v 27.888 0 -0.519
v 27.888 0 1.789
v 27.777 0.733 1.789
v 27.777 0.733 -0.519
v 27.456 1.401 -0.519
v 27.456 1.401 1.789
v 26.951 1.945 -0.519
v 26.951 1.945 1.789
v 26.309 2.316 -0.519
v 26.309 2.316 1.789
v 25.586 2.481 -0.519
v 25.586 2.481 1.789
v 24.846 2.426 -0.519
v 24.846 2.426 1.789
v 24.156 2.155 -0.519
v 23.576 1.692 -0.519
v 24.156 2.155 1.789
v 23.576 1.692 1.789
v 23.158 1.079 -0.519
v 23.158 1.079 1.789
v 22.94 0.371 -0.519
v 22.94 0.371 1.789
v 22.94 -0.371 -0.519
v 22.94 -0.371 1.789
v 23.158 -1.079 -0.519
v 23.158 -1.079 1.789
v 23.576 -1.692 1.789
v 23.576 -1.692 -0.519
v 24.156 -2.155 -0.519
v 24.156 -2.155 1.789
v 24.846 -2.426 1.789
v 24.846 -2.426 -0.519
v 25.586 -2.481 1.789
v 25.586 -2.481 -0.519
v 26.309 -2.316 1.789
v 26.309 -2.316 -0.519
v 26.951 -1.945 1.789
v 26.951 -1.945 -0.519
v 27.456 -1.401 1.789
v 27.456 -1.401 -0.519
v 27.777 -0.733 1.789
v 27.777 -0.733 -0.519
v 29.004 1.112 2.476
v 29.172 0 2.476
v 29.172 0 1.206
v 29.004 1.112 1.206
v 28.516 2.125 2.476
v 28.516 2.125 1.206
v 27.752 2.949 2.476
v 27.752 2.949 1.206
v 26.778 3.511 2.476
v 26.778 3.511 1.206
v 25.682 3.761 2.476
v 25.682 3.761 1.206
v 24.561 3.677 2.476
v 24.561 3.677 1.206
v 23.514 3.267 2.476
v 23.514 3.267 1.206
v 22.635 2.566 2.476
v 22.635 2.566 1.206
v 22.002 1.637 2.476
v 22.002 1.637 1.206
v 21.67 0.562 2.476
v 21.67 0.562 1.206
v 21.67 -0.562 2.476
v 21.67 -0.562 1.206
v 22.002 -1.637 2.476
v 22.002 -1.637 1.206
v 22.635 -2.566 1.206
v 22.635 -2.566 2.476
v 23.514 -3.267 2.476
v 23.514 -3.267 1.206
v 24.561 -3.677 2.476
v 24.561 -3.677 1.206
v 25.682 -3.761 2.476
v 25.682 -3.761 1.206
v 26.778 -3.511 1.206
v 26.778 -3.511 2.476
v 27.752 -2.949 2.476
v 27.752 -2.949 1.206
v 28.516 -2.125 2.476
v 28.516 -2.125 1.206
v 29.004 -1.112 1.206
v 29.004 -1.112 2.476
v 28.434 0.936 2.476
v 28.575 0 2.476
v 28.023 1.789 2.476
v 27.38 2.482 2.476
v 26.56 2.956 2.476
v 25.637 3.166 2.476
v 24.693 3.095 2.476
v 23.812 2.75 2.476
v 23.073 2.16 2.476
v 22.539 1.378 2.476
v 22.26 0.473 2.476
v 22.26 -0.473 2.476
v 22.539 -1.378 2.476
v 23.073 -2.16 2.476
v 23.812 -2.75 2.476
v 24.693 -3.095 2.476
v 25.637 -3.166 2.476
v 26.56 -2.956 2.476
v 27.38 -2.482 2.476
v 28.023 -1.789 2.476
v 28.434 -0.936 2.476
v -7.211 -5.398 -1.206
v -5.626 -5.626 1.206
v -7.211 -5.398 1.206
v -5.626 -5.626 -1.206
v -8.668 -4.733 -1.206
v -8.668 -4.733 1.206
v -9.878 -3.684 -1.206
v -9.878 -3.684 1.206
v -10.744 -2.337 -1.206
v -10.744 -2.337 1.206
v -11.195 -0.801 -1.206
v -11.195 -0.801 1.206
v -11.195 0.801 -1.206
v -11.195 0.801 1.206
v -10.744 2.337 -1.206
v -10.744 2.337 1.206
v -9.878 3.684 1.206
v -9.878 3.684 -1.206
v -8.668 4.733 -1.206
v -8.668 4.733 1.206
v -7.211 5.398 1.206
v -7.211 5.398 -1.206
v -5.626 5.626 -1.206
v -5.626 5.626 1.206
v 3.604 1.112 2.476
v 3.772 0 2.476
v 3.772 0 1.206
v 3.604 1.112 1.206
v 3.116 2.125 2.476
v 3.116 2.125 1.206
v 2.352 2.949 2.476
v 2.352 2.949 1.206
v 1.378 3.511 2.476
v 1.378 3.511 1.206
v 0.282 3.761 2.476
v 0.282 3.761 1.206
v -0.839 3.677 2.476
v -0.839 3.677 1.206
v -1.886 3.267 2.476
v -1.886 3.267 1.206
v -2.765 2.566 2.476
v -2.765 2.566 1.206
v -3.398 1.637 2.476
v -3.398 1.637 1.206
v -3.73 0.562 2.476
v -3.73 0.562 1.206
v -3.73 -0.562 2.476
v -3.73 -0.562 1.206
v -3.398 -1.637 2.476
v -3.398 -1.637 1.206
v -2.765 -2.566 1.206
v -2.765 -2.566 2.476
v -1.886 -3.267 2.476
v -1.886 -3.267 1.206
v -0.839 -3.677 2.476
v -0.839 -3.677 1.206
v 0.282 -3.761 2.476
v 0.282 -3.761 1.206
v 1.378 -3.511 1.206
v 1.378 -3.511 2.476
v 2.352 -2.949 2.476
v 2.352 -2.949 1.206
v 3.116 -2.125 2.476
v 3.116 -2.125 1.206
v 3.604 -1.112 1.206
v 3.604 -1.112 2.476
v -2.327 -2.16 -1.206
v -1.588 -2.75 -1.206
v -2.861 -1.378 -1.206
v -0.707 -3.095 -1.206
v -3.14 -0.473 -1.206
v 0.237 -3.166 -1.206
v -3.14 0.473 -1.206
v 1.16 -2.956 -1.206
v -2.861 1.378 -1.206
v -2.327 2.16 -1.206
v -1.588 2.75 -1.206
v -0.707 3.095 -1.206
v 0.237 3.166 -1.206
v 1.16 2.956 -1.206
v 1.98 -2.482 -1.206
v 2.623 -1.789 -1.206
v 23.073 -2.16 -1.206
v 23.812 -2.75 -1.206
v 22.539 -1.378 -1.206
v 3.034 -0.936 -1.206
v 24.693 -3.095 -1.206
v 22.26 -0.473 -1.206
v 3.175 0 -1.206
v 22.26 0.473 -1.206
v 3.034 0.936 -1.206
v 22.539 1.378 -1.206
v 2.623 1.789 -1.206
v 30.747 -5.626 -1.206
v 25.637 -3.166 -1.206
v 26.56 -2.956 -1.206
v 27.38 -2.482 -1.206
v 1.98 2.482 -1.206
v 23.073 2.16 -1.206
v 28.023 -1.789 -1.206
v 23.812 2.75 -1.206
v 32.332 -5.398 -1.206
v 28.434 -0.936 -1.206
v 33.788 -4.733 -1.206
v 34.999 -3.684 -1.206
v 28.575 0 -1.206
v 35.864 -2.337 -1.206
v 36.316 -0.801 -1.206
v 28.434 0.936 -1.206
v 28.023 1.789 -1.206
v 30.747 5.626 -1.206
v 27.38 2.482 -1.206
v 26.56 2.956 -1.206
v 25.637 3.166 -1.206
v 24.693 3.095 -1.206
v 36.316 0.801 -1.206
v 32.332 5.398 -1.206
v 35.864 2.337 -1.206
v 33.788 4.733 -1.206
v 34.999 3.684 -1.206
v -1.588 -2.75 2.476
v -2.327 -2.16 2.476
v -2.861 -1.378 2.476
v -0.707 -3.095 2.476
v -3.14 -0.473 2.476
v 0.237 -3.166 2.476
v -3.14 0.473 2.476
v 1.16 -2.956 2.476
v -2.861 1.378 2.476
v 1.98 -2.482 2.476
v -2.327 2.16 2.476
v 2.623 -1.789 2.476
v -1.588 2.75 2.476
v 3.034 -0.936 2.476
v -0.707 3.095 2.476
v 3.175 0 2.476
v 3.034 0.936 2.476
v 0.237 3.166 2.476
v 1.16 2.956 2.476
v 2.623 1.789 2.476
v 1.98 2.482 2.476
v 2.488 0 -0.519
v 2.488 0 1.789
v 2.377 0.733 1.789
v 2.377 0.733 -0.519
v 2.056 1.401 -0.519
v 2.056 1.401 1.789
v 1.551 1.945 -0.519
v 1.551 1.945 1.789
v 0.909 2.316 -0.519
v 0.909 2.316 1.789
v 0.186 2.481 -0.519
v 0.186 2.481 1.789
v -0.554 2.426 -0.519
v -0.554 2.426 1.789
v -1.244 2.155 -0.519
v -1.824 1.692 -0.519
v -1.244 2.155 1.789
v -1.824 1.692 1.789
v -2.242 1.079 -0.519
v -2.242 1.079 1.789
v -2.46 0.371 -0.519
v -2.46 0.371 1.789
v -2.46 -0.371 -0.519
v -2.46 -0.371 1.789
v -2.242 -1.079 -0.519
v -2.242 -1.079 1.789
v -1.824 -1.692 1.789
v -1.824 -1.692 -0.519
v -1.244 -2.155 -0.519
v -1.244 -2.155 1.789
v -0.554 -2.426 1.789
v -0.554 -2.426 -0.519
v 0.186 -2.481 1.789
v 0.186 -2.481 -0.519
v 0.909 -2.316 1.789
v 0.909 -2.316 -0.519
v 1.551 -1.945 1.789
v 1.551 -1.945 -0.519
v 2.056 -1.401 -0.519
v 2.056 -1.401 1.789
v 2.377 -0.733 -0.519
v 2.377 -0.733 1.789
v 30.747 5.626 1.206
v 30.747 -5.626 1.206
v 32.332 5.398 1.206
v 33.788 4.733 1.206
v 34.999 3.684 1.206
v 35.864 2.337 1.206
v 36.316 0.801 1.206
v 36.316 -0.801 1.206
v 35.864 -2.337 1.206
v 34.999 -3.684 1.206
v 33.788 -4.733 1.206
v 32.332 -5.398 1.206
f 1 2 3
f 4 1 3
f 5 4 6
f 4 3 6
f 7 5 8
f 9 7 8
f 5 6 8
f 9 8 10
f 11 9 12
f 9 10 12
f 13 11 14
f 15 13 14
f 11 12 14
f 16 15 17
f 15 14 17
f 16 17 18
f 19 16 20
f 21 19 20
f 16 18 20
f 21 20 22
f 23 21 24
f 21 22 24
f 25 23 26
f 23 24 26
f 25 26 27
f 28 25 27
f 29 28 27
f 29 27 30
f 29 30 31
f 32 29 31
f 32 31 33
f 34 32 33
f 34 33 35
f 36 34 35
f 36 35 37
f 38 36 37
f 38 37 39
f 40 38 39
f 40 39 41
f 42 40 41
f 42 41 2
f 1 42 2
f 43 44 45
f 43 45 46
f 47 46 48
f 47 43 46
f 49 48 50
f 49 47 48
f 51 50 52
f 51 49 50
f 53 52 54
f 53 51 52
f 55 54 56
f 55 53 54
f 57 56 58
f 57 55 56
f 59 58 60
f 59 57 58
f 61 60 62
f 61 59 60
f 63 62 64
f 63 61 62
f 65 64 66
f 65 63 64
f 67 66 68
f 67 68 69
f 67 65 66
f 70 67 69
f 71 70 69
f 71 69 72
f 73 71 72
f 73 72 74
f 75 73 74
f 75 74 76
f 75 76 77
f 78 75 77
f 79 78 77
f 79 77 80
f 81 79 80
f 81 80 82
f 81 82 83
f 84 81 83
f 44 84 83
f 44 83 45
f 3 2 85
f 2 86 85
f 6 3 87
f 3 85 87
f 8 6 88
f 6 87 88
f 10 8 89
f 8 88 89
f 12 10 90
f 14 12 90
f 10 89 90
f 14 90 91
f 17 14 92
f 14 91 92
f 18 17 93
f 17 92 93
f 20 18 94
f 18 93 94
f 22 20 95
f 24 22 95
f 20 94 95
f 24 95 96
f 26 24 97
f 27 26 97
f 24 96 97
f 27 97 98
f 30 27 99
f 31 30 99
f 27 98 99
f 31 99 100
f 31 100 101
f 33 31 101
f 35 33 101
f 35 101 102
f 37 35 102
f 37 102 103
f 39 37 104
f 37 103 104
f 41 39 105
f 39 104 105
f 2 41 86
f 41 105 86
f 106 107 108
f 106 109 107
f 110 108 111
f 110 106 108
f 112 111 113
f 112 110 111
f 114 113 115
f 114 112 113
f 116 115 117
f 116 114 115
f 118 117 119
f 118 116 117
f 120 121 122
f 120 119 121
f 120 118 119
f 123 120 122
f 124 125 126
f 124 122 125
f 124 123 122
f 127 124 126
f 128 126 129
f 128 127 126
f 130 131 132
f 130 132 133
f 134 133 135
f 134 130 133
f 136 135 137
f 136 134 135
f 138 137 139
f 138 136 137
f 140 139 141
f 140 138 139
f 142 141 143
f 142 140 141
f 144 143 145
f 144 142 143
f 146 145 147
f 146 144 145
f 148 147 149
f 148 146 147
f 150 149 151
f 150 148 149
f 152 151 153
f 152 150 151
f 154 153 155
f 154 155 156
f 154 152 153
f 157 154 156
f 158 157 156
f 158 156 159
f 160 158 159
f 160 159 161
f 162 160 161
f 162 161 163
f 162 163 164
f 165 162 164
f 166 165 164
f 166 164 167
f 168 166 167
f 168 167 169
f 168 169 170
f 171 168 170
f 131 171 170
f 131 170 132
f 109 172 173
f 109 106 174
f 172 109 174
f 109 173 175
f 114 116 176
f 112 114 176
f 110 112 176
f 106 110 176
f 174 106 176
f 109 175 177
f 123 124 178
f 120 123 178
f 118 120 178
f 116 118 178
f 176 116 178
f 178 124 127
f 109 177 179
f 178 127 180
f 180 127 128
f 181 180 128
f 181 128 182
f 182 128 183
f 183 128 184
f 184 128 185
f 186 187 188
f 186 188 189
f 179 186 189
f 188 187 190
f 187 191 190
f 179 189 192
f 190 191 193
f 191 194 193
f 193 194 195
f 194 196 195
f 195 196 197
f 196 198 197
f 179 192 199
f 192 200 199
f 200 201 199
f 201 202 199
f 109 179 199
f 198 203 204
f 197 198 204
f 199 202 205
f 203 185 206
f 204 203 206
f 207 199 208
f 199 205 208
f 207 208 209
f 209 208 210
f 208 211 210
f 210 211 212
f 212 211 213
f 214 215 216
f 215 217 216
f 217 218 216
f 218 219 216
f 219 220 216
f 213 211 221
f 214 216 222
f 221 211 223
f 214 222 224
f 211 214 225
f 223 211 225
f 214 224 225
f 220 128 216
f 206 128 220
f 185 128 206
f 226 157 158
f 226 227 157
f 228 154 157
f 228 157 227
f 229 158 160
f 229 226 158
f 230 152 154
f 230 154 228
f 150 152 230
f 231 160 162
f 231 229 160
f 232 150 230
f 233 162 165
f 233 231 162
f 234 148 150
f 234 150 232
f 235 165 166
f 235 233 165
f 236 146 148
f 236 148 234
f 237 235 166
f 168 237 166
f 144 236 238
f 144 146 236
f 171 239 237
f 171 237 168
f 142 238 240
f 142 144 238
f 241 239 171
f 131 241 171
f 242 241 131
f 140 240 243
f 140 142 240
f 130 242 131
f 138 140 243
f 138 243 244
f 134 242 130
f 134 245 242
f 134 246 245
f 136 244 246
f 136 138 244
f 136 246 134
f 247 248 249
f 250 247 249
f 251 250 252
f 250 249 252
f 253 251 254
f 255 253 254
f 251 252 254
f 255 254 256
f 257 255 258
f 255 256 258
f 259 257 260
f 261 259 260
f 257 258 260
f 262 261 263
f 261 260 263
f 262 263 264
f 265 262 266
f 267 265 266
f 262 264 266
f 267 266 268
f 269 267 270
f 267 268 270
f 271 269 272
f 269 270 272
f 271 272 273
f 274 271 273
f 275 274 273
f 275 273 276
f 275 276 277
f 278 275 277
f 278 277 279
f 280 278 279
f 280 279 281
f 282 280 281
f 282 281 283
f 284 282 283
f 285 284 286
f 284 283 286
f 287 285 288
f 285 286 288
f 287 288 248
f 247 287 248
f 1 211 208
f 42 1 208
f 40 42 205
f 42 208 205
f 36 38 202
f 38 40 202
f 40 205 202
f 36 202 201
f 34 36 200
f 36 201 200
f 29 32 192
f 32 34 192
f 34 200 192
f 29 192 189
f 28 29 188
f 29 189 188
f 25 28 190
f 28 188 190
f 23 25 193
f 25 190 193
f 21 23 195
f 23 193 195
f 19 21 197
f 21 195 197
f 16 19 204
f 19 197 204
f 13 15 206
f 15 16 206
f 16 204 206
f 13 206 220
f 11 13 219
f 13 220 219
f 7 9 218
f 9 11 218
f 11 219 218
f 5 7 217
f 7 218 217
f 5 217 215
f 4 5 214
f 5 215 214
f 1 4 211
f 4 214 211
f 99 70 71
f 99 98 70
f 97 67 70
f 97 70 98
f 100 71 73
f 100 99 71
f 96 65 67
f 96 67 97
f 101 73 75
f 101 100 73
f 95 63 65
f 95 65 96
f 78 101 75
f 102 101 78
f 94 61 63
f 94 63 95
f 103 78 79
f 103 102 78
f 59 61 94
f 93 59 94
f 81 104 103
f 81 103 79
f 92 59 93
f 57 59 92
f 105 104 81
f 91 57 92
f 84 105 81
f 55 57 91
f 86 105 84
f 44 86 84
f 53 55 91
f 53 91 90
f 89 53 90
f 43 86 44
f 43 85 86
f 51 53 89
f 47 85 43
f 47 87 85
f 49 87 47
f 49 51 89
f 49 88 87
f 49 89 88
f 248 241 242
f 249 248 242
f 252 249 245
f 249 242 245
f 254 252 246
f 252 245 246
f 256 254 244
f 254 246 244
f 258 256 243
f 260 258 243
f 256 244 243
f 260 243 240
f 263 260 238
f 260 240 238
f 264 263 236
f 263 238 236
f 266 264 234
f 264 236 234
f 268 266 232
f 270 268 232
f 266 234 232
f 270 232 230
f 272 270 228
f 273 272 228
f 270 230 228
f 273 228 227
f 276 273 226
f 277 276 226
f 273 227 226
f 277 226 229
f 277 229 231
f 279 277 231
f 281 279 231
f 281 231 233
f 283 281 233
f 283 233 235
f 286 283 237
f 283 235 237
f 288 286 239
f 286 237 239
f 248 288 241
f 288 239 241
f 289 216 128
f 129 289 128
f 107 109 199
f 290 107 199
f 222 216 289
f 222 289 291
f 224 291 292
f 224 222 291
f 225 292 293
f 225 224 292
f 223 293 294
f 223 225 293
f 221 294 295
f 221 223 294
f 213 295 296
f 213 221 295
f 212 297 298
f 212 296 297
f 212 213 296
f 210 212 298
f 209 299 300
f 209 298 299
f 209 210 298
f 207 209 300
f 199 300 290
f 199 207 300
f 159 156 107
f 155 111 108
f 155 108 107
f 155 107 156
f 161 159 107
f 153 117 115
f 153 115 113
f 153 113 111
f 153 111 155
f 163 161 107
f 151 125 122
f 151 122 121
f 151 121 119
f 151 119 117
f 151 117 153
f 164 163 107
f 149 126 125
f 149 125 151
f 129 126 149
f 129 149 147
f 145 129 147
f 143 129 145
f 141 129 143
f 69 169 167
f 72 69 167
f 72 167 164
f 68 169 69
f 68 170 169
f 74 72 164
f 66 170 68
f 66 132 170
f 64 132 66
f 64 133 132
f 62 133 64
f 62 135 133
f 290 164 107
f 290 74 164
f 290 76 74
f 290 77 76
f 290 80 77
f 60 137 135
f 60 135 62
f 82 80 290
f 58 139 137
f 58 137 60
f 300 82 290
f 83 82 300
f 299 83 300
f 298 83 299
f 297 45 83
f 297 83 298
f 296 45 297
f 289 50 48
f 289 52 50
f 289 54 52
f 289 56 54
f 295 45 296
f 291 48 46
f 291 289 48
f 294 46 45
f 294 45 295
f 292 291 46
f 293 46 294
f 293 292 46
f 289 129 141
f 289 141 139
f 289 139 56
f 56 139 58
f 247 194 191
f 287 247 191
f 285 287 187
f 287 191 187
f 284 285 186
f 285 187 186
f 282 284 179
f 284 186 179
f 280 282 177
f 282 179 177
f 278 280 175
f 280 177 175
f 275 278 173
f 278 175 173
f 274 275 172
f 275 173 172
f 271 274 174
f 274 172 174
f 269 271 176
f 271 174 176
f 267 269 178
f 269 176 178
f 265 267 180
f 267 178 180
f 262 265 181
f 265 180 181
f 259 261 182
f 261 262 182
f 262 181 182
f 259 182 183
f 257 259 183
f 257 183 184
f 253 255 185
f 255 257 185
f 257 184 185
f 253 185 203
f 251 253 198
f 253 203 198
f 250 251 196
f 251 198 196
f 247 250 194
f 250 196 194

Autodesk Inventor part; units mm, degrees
sketch "Sketch_1" plane through (0, 0, 0) normal (0, 0, 1) x (1, 0, 0)
  arc A0 (-5.6261, 5.6261) -> (-5.6261, -5.6261) centre (-5.6261, 0) ccw
  line L0 (-5.6261, -5.6261) -> (30.7467, -5.6261)
  arc A1 (30.7467, -5.6261) -> (30.7467, 5.6261) centre (30.7467, 0) ccw
  line L1 (30.7467, 5.6261) -> (-5.6261, 5.6261)
extrude "Extrusion1" add sketch "Sketch_1" along normal mid plane 2.413
sketch "Sketch_2" plane through (0, 0, 0) normal (0, 1, 0) x (-1, 0, 0)
  line L0 (0, 2.4765) -> (0, -1.2065)
  line L1 (0, -1.2065) -> (-3.7719, -1.2065)
  line L2 (-3.7719, -1.2065) -> (-3.7719, 2.4765)
  line L3 (-3.7719, 2.4765) -> (0, 2.4765)
  line L4 (0, 2.4765) -> (0, -1.2065)
revolve "Revolution1" add sketch "Sketch_2" angle 360 about axis through (0, 0, 2.4765) along (0, 0, 1)
sketch "Sketch_3" plane through (0, 0, 0) normal (0, 1, 0) x (-1, 0, 0)
  line L0 (-25.4, 2.4765) -> (-25.4, -1.2065)
  line L1 (-25.4, -1.2065) -> (-29.1719, -1.2065)
  line L2 (-29.1719, -1.2065) -> (-29.1719, 2.4765)
  line L3 (-29.1719, 2.4765) -> (-25.4, 2.4765)
  line L4 (-25.4, 2.4765) -> (-25.4, -1.2065)
revolve "Revolution2" add sketch "Sketch_3" angle 360 about axis through (25.4, 0, 2.4765) along (0, 0, 1)
sketch "Sketch_4" plane through (0, 0, 0) normal (0, 1, 0) x (-1, 0, 0)
  line L0 (0, 2.4765) -> (0, -1.2065)
  line L1 (0, -1.2065) -> (-3.175, -1.2065)
  line L2 (-3.175, -1.2065) -> (-2.4879, -0.5194)
  line L3 (-2.4879, -0.5194) -> (-2.4879, 1.7894)
  line L4 (-2.4879, 1.7894) -> (-3.175, 2.4765)
  line L5 (-3.175, 2.4765) -> (0, 2.4765)
  line L6 (0, 2.4765) -> (0, -1.2065)
revolve "Revolution3" cut sketch "Sketch_4" angle 360 about axis through (0, 0, 2.4765) along (0, 0, 1)
thread "Thread1" size "1/4-20 UNC" class "2B" standard "ANSI Unified Screw Threads" full length
sketch "Sketch_5" plane through (0, 0, 0) normal (0, 1, 0) x (-1, 0, 0)
  line L0 (-25.4, 2.4765) -> (-25.4, -1.2065)
  line L1 (-25.4, -1.2065) -> (-28.575, -1.2065)
  line L2 (-28.575, -1.2065) -> (-27.8879, -0.5194)
  line L3 (-27.8879, -0.5194) -> (-27.8879, 1.7894)
  line L4 (-27.8879, 1.7894) -> (-28.575, 2.4765)
  line L5 (-28.575, 2.4765) -> (-25.4, 2.4765)
  line L6 (-25.4, 2.4765) -> (-25.4, -1.2065)
revolve "Revolution4" cut sketch "Sketch_5" angle 360 about axis through (25.4, 0, 2.4765) along (0, 0, 1)
thread "Thread2" size "1/4-20 UNC" class "2B" standard "ANSI Unified Screw Threads" full length
ref_plane "tnut_XY" through (0, 0, -1.2065) normal (0, 0, 1) x (1, 0, 0)
ref_plane "tnut_YZ" through (0, 0, -1.2065) normal (1, 0, 0) x (0, 1, 0)
ref_plane "tnut_ZX" through (0, 0, -1.2065) normal (0, 1, 0) x (0, 0, 1)
ref_plane "tnut1_XY" through (25.4, 0, -1.2065) normal (0, 0, 1) x (1, 0, 0)
ref_plane "tnut1_YZ" through (25.4, 0, -1.2065) normal (1, 0, 0) x (0, 1, 0)
ref_plane "tnut1_ZX" through (25.4, 0, -1.2065) normal (0, 1, 0) x (0, 0, 1)
properties part number "3280"
